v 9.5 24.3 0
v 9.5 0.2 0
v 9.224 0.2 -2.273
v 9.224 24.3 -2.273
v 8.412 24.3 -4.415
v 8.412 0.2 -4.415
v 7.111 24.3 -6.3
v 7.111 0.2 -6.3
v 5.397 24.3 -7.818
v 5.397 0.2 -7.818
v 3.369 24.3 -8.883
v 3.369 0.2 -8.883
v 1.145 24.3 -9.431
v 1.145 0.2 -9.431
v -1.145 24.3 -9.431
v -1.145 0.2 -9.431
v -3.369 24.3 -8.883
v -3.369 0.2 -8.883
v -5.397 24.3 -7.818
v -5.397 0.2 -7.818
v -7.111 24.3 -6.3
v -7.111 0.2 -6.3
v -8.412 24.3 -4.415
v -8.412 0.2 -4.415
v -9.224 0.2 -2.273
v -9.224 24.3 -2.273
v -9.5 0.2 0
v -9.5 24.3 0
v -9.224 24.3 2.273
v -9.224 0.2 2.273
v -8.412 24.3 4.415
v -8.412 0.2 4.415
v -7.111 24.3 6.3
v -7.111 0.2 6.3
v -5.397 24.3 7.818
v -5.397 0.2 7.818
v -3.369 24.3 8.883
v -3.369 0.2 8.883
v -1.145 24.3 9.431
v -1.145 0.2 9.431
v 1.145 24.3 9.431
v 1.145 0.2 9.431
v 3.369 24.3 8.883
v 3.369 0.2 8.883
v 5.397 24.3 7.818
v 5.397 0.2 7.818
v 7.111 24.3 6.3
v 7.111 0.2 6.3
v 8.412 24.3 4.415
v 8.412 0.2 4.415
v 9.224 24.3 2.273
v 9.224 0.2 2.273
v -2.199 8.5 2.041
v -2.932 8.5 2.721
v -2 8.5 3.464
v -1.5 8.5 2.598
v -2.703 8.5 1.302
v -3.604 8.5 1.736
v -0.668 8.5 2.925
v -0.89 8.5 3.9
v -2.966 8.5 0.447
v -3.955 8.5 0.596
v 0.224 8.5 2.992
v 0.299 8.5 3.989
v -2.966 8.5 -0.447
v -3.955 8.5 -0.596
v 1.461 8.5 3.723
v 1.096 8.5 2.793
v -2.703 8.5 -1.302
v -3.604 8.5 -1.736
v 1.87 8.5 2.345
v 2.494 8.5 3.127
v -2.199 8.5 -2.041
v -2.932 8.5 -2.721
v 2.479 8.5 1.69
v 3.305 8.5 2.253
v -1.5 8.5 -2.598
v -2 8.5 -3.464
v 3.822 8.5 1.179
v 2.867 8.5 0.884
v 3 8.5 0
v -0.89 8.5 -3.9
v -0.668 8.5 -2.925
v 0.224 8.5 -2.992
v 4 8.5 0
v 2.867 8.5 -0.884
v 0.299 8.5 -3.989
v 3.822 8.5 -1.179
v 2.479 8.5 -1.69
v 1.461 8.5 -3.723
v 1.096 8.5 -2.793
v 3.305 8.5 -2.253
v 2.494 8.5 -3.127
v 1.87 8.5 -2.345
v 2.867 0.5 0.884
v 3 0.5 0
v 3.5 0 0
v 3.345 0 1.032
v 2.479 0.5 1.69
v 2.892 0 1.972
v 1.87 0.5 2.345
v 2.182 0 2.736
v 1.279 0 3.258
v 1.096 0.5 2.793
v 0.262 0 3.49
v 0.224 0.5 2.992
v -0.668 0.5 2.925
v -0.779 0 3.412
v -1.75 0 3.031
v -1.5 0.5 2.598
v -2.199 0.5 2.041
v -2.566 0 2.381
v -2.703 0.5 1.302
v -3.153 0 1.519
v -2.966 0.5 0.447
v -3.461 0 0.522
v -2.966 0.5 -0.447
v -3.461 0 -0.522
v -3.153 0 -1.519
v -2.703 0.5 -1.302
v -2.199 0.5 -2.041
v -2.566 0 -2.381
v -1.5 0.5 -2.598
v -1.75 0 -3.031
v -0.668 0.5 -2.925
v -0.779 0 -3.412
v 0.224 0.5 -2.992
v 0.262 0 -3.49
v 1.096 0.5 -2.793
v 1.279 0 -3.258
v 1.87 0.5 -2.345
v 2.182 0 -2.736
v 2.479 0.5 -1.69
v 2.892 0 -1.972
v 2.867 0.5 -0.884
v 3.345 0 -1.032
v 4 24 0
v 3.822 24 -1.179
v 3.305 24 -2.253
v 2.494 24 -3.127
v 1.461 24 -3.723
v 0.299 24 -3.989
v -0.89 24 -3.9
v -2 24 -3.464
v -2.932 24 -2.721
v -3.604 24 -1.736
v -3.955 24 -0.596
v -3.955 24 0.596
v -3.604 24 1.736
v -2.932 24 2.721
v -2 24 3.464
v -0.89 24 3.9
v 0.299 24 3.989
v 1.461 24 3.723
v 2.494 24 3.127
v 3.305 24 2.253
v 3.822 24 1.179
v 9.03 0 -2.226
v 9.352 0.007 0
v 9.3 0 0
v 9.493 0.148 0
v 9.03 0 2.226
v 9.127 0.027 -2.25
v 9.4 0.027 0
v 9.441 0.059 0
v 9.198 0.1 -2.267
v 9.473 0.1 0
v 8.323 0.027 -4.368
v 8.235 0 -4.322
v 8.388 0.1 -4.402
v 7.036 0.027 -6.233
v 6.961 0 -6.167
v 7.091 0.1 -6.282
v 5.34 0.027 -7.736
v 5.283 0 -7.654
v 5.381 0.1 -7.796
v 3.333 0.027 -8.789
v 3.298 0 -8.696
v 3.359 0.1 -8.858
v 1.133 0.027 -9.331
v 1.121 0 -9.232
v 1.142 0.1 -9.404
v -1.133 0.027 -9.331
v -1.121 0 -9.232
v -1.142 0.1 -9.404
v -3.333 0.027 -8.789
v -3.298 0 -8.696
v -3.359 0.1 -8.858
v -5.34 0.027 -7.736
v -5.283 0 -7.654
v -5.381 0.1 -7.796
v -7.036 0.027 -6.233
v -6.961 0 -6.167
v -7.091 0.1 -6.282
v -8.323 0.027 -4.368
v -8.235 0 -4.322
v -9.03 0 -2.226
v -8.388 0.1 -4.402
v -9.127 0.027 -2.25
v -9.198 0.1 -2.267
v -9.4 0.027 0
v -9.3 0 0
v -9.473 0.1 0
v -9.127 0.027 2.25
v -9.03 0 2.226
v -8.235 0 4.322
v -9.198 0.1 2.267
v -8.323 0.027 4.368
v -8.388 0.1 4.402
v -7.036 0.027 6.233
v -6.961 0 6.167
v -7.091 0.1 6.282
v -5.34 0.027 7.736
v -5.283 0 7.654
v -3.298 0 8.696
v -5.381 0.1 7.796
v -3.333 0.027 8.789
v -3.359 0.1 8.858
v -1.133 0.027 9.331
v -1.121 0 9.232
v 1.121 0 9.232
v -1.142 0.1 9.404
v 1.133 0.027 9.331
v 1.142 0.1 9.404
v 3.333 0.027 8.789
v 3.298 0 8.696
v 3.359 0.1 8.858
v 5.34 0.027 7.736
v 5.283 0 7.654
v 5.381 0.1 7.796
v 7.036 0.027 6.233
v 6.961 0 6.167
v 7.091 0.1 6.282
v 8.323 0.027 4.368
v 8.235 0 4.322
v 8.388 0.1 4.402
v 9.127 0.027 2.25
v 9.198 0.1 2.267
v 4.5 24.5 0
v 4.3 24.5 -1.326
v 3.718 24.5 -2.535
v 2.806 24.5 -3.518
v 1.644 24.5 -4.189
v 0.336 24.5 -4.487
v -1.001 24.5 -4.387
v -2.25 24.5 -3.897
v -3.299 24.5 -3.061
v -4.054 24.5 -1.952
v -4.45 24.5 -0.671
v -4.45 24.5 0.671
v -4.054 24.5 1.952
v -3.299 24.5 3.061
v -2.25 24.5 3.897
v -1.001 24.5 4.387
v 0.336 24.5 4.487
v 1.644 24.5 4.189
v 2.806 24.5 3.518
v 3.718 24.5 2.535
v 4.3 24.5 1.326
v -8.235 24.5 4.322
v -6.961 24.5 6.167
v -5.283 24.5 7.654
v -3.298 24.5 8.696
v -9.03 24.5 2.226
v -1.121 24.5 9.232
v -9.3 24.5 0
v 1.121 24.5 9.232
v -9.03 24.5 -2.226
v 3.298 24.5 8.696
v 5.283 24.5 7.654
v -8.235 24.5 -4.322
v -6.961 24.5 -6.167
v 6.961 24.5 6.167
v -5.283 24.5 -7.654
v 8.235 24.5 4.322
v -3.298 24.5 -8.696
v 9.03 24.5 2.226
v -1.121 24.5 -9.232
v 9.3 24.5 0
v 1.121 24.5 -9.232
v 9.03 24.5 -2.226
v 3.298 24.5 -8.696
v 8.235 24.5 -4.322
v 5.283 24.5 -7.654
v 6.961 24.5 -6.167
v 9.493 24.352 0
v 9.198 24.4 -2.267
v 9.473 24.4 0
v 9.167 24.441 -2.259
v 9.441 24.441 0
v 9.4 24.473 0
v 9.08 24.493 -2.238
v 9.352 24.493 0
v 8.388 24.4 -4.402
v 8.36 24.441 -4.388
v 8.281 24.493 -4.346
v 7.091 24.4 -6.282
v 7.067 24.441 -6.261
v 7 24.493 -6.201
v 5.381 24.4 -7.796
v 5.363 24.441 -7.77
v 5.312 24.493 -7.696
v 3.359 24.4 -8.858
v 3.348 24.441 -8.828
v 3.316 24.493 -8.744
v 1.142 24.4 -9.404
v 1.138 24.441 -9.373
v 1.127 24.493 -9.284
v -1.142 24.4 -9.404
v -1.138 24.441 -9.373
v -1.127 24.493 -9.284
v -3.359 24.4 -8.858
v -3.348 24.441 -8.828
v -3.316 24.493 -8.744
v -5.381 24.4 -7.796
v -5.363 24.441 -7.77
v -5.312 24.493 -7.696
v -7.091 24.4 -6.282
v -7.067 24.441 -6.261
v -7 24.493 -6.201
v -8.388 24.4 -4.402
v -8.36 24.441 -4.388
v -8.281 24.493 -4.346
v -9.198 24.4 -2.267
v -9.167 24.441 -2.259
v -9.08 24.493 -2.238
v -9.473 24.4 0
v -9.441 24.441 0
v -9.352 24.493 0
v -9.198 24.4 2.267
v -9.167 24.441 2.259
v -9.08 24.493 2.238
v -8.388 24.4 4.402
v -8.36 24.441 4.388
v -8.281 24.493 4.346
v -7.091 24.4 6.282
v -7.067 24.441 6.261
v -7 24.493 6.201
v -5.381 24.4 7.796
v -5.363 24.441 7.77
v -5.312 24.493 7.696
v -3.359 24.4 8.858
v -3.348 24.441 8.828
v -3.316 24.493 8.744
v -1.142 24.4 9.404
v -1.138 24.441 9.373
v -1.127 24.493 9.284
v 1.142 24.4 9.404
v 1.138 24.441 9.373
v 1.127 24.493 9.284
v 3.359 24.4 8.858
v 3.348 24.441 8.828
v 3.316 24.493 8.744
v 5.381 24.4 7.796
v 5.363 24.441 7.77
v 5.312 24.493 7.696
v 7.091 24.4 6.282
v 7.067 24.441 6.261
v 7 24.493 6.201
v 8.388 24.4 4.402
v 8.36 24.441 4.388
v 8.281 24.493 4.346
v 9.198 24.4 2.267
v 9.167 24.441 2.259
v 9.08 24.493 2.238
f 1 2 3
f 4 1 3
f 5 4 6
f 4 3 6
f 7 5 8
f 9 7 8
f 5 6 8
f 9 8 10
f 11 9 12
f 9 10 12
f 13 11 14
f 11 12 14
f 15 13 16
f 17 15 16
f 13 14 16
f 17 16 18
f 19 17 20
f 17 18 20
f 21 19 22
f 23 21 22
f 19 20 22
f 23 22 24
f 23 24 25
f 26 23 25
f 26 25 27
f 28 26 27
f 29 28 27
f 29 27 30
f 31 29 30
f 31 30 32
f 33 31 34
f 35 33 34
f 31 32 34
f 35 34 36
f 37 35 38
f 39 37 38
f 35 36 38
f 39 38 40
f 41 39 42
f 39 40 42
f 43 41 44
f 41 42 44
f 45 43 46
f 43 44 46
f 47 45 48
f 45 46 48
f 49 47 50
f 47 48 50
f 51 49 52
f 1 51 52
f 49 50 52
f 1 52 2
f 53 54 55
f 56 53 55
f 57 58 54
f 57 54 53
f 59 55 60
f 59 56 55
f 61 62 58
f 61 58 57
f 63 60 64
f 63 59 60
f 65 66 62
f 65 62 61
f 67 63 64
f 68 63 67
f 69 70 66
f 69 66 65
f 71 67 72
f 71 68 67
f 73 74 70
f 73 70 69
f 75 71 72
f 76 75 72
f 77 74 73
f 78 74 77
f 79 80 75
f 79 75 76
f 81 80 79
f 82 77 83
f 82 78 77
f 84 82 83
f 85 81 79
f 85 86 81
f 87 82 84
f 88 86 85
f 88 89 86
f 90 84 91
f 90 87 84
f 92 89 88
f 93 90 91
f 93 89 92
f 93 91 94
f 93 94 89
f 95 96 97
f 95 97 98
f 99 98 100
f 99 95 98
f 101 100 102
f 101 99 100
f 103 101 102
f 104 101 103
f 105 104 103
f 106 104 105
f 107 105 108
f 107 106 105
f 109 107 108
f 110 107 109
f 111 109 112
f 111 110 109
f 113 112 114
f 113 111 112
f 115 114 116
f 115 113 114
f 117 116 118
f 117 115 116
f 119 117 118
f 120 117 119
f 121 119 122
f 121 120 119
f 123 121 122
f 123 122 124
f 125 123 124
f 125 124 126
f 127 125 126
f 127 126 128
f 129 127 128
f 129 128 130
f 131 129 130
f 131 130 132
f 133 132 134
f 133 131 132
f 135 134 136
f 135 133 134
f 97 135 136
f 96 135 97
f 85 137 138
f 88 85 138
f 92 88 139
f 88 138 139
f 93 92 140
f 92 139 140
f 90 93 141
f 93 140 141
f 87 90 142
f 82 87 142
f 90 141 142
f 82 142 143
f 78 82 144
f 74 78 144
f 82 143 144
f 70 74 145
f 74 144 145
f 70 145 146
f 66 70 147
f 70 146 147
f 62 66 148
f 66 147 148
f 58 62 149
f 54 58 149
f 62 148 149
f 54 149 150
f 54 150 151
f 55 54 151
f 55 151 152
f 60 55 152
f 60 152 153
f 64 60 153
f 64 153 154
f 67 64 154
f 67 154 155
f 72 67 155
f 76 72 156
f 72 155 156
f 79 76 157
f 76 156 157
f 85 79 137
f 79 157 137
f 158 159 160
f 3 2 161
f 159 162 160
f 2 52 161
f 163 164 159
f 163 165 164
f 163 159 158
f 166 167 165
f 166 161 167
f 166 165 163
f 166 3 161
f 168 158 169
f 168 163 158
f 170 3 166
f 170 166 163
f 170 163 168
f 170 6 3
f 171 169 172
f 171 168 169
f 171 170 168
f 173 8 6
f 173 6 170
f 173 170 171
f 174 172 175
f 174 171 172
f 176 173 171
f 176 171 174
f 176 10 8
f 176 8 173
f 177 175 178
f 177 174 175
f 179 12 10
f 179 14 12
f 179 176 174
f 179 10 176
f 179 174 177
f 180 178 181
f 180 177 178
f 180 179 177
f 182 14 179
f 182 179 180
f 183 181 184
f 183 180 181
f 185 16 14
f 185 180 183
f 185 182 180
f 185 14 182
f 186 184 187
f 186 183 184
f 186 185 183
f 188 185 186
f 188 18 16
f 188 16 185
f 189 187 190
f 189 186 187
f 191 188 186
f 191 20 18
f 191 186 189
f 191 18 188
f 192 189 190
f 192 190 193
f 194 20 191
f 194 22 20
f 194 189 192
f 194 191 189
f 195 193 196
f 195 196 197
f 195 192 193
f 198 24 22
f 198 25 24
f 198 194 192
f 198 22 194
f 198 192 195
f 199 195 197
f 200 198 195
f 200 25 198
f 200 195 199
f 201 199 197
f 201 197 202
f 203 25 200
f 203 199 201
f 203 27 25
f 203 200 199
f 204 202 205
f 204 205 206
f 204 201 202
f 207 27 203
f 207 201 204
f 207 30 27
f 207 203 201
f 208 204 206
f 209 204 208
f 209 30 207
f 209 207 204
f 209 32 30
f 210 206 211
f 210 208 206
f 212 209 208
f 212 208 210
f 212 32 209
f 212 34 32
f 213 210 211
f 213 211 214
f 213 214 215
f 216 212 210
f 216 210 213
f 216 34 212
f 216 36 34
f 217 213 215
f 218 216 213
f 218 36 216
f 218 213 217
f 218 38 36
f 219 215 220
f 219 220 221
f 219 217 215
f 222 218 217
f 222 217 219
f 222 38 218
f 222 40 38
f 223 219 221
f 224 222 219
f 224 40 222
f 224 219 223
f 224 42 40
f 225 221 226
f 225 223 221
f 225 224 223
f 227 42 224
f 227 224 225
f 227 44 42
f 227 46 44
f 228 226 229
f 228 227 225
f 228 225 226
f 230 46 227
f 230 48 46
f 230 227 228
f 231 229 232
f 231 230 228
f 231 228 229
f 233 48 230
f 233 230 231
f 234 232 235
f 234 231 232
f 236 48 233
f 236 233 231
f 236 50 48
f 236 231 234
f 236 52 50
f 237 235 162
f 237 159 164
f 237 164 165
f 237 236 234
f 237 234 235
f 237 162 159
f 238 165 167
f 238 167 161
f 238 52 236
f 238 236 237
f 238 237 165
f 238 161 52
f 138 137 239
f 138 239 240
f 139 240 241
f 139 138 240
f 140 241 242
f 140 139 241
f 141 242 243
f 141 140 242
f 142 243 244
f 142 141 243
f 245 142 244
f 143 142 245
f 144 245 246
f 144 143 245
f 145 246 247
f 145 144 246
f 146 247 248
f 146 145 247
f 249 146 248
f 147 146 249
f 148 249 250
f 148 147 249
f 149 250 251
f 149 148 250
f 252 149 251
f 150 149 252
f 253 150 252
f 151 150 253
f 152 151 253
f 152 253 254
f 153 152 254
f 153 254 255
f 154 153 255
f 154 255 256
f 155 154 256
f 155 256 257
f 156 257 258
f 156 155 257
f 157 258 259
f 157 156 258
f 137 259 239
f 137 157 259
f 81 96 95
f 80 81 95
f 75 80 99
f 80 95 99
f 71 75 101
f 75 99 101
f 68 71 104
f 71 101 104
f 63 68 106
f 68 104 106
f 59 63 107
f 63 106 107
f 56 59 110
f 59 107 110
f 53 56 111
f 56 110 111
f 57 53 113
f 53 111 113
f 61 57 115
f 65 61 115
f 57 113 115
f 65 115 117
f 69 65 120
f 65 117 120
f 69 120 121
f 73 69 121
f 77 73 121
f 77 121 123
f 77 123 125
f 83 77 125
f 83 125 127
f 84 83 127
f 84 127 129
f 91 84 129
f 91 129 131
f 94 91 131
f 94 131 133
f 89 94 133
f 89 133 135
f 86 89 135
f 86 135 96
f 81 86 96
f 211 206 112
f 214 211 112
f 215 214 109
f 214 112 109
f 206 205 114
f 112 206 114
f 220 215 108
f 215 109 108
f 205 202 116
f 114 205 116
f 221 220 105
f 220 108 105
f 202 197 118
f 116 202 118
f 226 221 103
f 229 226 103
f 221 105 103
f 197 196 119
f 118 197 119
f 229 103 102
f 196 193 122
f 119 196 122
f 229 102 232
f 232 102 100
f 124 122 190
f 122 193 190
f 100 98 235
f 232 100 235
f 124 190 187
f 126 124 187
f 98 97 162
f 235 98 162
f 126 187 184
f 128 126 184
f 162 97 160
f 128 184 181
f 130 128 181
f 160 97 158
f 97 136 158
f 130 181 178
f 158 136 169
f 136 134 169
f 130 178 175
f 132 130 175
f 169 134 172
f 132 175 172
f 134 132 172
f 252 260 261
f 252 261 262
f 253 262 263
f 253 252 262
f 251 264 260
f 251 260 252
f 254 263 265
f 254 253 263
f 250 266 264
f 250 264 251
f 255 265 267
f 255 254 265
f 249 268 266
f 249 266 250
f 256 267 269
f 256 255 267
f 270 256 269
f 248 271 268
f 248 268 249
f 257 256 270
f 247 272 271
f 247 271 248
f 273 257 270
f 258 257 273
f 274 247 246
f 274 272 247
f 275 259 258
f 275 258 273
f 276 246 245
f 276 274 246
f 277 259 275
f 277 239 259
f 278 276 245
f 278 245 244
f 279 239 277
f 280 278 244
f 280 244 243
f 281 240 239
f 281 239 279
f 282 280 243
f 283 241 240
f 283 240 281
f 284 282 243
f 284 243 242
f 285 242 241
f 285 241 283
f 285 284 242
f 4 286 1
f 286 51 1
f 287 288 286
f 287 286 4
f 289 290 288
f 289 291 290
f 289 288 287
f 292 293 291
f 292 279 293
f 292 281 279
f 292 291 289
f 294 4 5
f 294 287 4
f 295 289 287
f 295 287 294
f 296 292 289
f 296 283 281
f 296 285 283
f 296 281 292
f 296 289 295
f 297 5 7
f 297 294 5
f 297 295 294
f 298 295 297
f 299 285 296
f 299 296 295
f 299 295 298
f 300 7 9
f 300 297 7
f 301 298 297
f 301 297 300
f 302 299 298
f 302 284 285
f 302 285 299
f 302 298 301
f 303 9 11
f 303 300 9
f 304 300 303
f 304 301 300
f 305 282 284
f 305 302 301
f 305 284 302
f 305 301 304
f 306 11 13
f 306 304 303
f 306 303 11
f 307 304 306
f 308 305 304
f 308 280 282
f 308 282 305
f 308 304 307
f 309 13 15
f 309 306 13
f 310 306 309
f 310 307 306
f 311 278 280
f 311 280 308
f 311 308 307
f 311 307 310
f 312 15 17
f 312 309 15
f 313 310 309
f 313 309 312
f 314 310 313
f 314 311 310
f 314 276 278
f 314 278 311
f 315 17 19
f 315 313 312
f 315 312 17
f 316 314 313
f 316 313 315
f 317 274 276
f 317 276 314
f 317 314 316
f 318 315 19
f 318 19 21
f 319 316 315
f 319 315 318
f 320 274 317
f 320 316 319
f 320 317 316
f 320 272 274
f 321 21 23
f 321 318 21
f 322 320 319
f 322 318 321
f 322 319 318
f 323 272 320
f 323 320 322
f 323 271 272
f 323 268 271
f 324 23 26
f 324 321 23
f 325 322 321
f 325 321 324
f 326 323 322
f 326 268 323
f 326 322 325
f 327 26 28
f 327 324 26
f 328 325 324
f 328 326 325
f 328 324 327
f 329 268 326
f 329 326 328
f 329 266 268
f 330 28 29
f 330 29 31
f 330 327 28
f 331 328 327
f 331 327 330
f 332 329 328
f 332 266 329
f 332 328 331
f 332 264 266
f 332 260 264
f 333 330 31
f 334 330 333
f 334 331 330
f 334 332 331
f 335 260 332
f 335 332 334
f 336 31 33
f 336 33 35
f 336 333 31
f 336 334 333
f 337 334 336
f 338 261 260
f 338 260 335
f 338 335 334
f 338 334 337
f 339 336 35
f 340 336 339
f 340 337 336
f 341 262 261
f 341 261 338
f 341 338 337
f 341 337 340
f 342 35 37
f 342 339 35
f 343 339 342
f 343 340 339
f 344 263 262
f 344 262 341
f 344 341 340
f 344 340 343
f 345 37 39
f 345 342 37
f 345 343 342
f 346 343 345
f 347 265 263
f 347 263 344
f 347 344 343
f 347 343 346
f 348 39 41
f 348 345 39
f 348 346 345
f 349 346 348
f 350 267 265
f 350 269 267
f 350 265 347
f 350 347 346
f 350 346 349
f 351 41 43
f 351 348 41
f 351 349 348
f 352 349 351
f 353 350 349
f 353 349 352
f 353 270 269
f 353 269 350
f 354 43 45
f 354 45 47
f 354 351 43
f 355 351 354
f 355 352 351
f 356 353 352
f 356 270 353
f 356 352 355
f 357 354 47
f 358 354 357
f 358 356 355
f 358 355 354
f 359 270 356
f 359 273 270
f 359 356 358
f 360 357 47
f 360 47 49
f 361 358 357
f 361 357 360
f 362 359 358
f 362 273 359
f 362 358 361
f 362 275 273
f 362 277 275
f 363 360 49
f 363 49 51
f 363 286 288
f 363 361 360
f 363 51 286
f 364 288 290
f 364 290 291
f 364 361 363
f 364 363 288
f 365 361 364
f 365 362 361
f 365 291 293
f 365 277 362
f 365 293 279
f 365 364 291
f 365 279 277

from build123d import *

# Parameters (mm, degrees)
SKETCH_1_R          = 9.5
EXTRUDE_1_DEPTH     = 24.5
SKETCH_2_R          = 4
CUT_EXTRUDE_1_DEPTH = 16
SKETCH_3_R          = 3
CUT_EXTRUDE_2_DEPTH = 16
CHAMFER_1_SIZE      = 0.5
FILLET_1_R          = 0.2


with BuildPart() as part:
    # 草图1 → 凸台-拉伸1 (new body)
    with BuildSketch(Plane(origin=(0, 0, 0), x_dir=(1, 0, 0), z_dir=(0, 1, 0))):
        Circle(SKETCH_1_R)
    extrude(amount=EXTRUDE_1_DEPTH)

    # 草图2 → 切除-拉伸1 (cut)
    with BuildSketch(Plane(origin=(0, 24.5, 0), x_dir=(1, 0, 0), z_dir=(0, 1, 0))):
        Circle(SKETCH_2_R)
    extrude(amount=-CUT_EXTRUDE_1_DEPTH, mode=Mode.SUBTRACT)

    # 草图3 → 切除-拉伸2 (cut)
    with BuildSketch(Plane.XZ):
        Circle(SKETCH_3_R)
    extrude(amount=-CUT_EXTRUDE_2_DEPTH, mode=Mode.SUBTRACT)

    # 倒角1
    chamfer_1_edges = [part.edges().sort_by_distance(p)[0] for p in [
        (-3, 0, 0),
        (-4, 24.5, 0),
    ]]
    chamfer(chamfer_1_edges, length=CHAMFER_1_SIZE)

    # 圆角1
    fillet_1_edges = [part.edges().sort_by_distance(p)[0] for p in [
        (-9.5, 0, 0),
        (-9.5, 24.5, 0),
    ]]
    fillet(fillet_1_edges, radius=FILLET_1_R)


solid = part.part
